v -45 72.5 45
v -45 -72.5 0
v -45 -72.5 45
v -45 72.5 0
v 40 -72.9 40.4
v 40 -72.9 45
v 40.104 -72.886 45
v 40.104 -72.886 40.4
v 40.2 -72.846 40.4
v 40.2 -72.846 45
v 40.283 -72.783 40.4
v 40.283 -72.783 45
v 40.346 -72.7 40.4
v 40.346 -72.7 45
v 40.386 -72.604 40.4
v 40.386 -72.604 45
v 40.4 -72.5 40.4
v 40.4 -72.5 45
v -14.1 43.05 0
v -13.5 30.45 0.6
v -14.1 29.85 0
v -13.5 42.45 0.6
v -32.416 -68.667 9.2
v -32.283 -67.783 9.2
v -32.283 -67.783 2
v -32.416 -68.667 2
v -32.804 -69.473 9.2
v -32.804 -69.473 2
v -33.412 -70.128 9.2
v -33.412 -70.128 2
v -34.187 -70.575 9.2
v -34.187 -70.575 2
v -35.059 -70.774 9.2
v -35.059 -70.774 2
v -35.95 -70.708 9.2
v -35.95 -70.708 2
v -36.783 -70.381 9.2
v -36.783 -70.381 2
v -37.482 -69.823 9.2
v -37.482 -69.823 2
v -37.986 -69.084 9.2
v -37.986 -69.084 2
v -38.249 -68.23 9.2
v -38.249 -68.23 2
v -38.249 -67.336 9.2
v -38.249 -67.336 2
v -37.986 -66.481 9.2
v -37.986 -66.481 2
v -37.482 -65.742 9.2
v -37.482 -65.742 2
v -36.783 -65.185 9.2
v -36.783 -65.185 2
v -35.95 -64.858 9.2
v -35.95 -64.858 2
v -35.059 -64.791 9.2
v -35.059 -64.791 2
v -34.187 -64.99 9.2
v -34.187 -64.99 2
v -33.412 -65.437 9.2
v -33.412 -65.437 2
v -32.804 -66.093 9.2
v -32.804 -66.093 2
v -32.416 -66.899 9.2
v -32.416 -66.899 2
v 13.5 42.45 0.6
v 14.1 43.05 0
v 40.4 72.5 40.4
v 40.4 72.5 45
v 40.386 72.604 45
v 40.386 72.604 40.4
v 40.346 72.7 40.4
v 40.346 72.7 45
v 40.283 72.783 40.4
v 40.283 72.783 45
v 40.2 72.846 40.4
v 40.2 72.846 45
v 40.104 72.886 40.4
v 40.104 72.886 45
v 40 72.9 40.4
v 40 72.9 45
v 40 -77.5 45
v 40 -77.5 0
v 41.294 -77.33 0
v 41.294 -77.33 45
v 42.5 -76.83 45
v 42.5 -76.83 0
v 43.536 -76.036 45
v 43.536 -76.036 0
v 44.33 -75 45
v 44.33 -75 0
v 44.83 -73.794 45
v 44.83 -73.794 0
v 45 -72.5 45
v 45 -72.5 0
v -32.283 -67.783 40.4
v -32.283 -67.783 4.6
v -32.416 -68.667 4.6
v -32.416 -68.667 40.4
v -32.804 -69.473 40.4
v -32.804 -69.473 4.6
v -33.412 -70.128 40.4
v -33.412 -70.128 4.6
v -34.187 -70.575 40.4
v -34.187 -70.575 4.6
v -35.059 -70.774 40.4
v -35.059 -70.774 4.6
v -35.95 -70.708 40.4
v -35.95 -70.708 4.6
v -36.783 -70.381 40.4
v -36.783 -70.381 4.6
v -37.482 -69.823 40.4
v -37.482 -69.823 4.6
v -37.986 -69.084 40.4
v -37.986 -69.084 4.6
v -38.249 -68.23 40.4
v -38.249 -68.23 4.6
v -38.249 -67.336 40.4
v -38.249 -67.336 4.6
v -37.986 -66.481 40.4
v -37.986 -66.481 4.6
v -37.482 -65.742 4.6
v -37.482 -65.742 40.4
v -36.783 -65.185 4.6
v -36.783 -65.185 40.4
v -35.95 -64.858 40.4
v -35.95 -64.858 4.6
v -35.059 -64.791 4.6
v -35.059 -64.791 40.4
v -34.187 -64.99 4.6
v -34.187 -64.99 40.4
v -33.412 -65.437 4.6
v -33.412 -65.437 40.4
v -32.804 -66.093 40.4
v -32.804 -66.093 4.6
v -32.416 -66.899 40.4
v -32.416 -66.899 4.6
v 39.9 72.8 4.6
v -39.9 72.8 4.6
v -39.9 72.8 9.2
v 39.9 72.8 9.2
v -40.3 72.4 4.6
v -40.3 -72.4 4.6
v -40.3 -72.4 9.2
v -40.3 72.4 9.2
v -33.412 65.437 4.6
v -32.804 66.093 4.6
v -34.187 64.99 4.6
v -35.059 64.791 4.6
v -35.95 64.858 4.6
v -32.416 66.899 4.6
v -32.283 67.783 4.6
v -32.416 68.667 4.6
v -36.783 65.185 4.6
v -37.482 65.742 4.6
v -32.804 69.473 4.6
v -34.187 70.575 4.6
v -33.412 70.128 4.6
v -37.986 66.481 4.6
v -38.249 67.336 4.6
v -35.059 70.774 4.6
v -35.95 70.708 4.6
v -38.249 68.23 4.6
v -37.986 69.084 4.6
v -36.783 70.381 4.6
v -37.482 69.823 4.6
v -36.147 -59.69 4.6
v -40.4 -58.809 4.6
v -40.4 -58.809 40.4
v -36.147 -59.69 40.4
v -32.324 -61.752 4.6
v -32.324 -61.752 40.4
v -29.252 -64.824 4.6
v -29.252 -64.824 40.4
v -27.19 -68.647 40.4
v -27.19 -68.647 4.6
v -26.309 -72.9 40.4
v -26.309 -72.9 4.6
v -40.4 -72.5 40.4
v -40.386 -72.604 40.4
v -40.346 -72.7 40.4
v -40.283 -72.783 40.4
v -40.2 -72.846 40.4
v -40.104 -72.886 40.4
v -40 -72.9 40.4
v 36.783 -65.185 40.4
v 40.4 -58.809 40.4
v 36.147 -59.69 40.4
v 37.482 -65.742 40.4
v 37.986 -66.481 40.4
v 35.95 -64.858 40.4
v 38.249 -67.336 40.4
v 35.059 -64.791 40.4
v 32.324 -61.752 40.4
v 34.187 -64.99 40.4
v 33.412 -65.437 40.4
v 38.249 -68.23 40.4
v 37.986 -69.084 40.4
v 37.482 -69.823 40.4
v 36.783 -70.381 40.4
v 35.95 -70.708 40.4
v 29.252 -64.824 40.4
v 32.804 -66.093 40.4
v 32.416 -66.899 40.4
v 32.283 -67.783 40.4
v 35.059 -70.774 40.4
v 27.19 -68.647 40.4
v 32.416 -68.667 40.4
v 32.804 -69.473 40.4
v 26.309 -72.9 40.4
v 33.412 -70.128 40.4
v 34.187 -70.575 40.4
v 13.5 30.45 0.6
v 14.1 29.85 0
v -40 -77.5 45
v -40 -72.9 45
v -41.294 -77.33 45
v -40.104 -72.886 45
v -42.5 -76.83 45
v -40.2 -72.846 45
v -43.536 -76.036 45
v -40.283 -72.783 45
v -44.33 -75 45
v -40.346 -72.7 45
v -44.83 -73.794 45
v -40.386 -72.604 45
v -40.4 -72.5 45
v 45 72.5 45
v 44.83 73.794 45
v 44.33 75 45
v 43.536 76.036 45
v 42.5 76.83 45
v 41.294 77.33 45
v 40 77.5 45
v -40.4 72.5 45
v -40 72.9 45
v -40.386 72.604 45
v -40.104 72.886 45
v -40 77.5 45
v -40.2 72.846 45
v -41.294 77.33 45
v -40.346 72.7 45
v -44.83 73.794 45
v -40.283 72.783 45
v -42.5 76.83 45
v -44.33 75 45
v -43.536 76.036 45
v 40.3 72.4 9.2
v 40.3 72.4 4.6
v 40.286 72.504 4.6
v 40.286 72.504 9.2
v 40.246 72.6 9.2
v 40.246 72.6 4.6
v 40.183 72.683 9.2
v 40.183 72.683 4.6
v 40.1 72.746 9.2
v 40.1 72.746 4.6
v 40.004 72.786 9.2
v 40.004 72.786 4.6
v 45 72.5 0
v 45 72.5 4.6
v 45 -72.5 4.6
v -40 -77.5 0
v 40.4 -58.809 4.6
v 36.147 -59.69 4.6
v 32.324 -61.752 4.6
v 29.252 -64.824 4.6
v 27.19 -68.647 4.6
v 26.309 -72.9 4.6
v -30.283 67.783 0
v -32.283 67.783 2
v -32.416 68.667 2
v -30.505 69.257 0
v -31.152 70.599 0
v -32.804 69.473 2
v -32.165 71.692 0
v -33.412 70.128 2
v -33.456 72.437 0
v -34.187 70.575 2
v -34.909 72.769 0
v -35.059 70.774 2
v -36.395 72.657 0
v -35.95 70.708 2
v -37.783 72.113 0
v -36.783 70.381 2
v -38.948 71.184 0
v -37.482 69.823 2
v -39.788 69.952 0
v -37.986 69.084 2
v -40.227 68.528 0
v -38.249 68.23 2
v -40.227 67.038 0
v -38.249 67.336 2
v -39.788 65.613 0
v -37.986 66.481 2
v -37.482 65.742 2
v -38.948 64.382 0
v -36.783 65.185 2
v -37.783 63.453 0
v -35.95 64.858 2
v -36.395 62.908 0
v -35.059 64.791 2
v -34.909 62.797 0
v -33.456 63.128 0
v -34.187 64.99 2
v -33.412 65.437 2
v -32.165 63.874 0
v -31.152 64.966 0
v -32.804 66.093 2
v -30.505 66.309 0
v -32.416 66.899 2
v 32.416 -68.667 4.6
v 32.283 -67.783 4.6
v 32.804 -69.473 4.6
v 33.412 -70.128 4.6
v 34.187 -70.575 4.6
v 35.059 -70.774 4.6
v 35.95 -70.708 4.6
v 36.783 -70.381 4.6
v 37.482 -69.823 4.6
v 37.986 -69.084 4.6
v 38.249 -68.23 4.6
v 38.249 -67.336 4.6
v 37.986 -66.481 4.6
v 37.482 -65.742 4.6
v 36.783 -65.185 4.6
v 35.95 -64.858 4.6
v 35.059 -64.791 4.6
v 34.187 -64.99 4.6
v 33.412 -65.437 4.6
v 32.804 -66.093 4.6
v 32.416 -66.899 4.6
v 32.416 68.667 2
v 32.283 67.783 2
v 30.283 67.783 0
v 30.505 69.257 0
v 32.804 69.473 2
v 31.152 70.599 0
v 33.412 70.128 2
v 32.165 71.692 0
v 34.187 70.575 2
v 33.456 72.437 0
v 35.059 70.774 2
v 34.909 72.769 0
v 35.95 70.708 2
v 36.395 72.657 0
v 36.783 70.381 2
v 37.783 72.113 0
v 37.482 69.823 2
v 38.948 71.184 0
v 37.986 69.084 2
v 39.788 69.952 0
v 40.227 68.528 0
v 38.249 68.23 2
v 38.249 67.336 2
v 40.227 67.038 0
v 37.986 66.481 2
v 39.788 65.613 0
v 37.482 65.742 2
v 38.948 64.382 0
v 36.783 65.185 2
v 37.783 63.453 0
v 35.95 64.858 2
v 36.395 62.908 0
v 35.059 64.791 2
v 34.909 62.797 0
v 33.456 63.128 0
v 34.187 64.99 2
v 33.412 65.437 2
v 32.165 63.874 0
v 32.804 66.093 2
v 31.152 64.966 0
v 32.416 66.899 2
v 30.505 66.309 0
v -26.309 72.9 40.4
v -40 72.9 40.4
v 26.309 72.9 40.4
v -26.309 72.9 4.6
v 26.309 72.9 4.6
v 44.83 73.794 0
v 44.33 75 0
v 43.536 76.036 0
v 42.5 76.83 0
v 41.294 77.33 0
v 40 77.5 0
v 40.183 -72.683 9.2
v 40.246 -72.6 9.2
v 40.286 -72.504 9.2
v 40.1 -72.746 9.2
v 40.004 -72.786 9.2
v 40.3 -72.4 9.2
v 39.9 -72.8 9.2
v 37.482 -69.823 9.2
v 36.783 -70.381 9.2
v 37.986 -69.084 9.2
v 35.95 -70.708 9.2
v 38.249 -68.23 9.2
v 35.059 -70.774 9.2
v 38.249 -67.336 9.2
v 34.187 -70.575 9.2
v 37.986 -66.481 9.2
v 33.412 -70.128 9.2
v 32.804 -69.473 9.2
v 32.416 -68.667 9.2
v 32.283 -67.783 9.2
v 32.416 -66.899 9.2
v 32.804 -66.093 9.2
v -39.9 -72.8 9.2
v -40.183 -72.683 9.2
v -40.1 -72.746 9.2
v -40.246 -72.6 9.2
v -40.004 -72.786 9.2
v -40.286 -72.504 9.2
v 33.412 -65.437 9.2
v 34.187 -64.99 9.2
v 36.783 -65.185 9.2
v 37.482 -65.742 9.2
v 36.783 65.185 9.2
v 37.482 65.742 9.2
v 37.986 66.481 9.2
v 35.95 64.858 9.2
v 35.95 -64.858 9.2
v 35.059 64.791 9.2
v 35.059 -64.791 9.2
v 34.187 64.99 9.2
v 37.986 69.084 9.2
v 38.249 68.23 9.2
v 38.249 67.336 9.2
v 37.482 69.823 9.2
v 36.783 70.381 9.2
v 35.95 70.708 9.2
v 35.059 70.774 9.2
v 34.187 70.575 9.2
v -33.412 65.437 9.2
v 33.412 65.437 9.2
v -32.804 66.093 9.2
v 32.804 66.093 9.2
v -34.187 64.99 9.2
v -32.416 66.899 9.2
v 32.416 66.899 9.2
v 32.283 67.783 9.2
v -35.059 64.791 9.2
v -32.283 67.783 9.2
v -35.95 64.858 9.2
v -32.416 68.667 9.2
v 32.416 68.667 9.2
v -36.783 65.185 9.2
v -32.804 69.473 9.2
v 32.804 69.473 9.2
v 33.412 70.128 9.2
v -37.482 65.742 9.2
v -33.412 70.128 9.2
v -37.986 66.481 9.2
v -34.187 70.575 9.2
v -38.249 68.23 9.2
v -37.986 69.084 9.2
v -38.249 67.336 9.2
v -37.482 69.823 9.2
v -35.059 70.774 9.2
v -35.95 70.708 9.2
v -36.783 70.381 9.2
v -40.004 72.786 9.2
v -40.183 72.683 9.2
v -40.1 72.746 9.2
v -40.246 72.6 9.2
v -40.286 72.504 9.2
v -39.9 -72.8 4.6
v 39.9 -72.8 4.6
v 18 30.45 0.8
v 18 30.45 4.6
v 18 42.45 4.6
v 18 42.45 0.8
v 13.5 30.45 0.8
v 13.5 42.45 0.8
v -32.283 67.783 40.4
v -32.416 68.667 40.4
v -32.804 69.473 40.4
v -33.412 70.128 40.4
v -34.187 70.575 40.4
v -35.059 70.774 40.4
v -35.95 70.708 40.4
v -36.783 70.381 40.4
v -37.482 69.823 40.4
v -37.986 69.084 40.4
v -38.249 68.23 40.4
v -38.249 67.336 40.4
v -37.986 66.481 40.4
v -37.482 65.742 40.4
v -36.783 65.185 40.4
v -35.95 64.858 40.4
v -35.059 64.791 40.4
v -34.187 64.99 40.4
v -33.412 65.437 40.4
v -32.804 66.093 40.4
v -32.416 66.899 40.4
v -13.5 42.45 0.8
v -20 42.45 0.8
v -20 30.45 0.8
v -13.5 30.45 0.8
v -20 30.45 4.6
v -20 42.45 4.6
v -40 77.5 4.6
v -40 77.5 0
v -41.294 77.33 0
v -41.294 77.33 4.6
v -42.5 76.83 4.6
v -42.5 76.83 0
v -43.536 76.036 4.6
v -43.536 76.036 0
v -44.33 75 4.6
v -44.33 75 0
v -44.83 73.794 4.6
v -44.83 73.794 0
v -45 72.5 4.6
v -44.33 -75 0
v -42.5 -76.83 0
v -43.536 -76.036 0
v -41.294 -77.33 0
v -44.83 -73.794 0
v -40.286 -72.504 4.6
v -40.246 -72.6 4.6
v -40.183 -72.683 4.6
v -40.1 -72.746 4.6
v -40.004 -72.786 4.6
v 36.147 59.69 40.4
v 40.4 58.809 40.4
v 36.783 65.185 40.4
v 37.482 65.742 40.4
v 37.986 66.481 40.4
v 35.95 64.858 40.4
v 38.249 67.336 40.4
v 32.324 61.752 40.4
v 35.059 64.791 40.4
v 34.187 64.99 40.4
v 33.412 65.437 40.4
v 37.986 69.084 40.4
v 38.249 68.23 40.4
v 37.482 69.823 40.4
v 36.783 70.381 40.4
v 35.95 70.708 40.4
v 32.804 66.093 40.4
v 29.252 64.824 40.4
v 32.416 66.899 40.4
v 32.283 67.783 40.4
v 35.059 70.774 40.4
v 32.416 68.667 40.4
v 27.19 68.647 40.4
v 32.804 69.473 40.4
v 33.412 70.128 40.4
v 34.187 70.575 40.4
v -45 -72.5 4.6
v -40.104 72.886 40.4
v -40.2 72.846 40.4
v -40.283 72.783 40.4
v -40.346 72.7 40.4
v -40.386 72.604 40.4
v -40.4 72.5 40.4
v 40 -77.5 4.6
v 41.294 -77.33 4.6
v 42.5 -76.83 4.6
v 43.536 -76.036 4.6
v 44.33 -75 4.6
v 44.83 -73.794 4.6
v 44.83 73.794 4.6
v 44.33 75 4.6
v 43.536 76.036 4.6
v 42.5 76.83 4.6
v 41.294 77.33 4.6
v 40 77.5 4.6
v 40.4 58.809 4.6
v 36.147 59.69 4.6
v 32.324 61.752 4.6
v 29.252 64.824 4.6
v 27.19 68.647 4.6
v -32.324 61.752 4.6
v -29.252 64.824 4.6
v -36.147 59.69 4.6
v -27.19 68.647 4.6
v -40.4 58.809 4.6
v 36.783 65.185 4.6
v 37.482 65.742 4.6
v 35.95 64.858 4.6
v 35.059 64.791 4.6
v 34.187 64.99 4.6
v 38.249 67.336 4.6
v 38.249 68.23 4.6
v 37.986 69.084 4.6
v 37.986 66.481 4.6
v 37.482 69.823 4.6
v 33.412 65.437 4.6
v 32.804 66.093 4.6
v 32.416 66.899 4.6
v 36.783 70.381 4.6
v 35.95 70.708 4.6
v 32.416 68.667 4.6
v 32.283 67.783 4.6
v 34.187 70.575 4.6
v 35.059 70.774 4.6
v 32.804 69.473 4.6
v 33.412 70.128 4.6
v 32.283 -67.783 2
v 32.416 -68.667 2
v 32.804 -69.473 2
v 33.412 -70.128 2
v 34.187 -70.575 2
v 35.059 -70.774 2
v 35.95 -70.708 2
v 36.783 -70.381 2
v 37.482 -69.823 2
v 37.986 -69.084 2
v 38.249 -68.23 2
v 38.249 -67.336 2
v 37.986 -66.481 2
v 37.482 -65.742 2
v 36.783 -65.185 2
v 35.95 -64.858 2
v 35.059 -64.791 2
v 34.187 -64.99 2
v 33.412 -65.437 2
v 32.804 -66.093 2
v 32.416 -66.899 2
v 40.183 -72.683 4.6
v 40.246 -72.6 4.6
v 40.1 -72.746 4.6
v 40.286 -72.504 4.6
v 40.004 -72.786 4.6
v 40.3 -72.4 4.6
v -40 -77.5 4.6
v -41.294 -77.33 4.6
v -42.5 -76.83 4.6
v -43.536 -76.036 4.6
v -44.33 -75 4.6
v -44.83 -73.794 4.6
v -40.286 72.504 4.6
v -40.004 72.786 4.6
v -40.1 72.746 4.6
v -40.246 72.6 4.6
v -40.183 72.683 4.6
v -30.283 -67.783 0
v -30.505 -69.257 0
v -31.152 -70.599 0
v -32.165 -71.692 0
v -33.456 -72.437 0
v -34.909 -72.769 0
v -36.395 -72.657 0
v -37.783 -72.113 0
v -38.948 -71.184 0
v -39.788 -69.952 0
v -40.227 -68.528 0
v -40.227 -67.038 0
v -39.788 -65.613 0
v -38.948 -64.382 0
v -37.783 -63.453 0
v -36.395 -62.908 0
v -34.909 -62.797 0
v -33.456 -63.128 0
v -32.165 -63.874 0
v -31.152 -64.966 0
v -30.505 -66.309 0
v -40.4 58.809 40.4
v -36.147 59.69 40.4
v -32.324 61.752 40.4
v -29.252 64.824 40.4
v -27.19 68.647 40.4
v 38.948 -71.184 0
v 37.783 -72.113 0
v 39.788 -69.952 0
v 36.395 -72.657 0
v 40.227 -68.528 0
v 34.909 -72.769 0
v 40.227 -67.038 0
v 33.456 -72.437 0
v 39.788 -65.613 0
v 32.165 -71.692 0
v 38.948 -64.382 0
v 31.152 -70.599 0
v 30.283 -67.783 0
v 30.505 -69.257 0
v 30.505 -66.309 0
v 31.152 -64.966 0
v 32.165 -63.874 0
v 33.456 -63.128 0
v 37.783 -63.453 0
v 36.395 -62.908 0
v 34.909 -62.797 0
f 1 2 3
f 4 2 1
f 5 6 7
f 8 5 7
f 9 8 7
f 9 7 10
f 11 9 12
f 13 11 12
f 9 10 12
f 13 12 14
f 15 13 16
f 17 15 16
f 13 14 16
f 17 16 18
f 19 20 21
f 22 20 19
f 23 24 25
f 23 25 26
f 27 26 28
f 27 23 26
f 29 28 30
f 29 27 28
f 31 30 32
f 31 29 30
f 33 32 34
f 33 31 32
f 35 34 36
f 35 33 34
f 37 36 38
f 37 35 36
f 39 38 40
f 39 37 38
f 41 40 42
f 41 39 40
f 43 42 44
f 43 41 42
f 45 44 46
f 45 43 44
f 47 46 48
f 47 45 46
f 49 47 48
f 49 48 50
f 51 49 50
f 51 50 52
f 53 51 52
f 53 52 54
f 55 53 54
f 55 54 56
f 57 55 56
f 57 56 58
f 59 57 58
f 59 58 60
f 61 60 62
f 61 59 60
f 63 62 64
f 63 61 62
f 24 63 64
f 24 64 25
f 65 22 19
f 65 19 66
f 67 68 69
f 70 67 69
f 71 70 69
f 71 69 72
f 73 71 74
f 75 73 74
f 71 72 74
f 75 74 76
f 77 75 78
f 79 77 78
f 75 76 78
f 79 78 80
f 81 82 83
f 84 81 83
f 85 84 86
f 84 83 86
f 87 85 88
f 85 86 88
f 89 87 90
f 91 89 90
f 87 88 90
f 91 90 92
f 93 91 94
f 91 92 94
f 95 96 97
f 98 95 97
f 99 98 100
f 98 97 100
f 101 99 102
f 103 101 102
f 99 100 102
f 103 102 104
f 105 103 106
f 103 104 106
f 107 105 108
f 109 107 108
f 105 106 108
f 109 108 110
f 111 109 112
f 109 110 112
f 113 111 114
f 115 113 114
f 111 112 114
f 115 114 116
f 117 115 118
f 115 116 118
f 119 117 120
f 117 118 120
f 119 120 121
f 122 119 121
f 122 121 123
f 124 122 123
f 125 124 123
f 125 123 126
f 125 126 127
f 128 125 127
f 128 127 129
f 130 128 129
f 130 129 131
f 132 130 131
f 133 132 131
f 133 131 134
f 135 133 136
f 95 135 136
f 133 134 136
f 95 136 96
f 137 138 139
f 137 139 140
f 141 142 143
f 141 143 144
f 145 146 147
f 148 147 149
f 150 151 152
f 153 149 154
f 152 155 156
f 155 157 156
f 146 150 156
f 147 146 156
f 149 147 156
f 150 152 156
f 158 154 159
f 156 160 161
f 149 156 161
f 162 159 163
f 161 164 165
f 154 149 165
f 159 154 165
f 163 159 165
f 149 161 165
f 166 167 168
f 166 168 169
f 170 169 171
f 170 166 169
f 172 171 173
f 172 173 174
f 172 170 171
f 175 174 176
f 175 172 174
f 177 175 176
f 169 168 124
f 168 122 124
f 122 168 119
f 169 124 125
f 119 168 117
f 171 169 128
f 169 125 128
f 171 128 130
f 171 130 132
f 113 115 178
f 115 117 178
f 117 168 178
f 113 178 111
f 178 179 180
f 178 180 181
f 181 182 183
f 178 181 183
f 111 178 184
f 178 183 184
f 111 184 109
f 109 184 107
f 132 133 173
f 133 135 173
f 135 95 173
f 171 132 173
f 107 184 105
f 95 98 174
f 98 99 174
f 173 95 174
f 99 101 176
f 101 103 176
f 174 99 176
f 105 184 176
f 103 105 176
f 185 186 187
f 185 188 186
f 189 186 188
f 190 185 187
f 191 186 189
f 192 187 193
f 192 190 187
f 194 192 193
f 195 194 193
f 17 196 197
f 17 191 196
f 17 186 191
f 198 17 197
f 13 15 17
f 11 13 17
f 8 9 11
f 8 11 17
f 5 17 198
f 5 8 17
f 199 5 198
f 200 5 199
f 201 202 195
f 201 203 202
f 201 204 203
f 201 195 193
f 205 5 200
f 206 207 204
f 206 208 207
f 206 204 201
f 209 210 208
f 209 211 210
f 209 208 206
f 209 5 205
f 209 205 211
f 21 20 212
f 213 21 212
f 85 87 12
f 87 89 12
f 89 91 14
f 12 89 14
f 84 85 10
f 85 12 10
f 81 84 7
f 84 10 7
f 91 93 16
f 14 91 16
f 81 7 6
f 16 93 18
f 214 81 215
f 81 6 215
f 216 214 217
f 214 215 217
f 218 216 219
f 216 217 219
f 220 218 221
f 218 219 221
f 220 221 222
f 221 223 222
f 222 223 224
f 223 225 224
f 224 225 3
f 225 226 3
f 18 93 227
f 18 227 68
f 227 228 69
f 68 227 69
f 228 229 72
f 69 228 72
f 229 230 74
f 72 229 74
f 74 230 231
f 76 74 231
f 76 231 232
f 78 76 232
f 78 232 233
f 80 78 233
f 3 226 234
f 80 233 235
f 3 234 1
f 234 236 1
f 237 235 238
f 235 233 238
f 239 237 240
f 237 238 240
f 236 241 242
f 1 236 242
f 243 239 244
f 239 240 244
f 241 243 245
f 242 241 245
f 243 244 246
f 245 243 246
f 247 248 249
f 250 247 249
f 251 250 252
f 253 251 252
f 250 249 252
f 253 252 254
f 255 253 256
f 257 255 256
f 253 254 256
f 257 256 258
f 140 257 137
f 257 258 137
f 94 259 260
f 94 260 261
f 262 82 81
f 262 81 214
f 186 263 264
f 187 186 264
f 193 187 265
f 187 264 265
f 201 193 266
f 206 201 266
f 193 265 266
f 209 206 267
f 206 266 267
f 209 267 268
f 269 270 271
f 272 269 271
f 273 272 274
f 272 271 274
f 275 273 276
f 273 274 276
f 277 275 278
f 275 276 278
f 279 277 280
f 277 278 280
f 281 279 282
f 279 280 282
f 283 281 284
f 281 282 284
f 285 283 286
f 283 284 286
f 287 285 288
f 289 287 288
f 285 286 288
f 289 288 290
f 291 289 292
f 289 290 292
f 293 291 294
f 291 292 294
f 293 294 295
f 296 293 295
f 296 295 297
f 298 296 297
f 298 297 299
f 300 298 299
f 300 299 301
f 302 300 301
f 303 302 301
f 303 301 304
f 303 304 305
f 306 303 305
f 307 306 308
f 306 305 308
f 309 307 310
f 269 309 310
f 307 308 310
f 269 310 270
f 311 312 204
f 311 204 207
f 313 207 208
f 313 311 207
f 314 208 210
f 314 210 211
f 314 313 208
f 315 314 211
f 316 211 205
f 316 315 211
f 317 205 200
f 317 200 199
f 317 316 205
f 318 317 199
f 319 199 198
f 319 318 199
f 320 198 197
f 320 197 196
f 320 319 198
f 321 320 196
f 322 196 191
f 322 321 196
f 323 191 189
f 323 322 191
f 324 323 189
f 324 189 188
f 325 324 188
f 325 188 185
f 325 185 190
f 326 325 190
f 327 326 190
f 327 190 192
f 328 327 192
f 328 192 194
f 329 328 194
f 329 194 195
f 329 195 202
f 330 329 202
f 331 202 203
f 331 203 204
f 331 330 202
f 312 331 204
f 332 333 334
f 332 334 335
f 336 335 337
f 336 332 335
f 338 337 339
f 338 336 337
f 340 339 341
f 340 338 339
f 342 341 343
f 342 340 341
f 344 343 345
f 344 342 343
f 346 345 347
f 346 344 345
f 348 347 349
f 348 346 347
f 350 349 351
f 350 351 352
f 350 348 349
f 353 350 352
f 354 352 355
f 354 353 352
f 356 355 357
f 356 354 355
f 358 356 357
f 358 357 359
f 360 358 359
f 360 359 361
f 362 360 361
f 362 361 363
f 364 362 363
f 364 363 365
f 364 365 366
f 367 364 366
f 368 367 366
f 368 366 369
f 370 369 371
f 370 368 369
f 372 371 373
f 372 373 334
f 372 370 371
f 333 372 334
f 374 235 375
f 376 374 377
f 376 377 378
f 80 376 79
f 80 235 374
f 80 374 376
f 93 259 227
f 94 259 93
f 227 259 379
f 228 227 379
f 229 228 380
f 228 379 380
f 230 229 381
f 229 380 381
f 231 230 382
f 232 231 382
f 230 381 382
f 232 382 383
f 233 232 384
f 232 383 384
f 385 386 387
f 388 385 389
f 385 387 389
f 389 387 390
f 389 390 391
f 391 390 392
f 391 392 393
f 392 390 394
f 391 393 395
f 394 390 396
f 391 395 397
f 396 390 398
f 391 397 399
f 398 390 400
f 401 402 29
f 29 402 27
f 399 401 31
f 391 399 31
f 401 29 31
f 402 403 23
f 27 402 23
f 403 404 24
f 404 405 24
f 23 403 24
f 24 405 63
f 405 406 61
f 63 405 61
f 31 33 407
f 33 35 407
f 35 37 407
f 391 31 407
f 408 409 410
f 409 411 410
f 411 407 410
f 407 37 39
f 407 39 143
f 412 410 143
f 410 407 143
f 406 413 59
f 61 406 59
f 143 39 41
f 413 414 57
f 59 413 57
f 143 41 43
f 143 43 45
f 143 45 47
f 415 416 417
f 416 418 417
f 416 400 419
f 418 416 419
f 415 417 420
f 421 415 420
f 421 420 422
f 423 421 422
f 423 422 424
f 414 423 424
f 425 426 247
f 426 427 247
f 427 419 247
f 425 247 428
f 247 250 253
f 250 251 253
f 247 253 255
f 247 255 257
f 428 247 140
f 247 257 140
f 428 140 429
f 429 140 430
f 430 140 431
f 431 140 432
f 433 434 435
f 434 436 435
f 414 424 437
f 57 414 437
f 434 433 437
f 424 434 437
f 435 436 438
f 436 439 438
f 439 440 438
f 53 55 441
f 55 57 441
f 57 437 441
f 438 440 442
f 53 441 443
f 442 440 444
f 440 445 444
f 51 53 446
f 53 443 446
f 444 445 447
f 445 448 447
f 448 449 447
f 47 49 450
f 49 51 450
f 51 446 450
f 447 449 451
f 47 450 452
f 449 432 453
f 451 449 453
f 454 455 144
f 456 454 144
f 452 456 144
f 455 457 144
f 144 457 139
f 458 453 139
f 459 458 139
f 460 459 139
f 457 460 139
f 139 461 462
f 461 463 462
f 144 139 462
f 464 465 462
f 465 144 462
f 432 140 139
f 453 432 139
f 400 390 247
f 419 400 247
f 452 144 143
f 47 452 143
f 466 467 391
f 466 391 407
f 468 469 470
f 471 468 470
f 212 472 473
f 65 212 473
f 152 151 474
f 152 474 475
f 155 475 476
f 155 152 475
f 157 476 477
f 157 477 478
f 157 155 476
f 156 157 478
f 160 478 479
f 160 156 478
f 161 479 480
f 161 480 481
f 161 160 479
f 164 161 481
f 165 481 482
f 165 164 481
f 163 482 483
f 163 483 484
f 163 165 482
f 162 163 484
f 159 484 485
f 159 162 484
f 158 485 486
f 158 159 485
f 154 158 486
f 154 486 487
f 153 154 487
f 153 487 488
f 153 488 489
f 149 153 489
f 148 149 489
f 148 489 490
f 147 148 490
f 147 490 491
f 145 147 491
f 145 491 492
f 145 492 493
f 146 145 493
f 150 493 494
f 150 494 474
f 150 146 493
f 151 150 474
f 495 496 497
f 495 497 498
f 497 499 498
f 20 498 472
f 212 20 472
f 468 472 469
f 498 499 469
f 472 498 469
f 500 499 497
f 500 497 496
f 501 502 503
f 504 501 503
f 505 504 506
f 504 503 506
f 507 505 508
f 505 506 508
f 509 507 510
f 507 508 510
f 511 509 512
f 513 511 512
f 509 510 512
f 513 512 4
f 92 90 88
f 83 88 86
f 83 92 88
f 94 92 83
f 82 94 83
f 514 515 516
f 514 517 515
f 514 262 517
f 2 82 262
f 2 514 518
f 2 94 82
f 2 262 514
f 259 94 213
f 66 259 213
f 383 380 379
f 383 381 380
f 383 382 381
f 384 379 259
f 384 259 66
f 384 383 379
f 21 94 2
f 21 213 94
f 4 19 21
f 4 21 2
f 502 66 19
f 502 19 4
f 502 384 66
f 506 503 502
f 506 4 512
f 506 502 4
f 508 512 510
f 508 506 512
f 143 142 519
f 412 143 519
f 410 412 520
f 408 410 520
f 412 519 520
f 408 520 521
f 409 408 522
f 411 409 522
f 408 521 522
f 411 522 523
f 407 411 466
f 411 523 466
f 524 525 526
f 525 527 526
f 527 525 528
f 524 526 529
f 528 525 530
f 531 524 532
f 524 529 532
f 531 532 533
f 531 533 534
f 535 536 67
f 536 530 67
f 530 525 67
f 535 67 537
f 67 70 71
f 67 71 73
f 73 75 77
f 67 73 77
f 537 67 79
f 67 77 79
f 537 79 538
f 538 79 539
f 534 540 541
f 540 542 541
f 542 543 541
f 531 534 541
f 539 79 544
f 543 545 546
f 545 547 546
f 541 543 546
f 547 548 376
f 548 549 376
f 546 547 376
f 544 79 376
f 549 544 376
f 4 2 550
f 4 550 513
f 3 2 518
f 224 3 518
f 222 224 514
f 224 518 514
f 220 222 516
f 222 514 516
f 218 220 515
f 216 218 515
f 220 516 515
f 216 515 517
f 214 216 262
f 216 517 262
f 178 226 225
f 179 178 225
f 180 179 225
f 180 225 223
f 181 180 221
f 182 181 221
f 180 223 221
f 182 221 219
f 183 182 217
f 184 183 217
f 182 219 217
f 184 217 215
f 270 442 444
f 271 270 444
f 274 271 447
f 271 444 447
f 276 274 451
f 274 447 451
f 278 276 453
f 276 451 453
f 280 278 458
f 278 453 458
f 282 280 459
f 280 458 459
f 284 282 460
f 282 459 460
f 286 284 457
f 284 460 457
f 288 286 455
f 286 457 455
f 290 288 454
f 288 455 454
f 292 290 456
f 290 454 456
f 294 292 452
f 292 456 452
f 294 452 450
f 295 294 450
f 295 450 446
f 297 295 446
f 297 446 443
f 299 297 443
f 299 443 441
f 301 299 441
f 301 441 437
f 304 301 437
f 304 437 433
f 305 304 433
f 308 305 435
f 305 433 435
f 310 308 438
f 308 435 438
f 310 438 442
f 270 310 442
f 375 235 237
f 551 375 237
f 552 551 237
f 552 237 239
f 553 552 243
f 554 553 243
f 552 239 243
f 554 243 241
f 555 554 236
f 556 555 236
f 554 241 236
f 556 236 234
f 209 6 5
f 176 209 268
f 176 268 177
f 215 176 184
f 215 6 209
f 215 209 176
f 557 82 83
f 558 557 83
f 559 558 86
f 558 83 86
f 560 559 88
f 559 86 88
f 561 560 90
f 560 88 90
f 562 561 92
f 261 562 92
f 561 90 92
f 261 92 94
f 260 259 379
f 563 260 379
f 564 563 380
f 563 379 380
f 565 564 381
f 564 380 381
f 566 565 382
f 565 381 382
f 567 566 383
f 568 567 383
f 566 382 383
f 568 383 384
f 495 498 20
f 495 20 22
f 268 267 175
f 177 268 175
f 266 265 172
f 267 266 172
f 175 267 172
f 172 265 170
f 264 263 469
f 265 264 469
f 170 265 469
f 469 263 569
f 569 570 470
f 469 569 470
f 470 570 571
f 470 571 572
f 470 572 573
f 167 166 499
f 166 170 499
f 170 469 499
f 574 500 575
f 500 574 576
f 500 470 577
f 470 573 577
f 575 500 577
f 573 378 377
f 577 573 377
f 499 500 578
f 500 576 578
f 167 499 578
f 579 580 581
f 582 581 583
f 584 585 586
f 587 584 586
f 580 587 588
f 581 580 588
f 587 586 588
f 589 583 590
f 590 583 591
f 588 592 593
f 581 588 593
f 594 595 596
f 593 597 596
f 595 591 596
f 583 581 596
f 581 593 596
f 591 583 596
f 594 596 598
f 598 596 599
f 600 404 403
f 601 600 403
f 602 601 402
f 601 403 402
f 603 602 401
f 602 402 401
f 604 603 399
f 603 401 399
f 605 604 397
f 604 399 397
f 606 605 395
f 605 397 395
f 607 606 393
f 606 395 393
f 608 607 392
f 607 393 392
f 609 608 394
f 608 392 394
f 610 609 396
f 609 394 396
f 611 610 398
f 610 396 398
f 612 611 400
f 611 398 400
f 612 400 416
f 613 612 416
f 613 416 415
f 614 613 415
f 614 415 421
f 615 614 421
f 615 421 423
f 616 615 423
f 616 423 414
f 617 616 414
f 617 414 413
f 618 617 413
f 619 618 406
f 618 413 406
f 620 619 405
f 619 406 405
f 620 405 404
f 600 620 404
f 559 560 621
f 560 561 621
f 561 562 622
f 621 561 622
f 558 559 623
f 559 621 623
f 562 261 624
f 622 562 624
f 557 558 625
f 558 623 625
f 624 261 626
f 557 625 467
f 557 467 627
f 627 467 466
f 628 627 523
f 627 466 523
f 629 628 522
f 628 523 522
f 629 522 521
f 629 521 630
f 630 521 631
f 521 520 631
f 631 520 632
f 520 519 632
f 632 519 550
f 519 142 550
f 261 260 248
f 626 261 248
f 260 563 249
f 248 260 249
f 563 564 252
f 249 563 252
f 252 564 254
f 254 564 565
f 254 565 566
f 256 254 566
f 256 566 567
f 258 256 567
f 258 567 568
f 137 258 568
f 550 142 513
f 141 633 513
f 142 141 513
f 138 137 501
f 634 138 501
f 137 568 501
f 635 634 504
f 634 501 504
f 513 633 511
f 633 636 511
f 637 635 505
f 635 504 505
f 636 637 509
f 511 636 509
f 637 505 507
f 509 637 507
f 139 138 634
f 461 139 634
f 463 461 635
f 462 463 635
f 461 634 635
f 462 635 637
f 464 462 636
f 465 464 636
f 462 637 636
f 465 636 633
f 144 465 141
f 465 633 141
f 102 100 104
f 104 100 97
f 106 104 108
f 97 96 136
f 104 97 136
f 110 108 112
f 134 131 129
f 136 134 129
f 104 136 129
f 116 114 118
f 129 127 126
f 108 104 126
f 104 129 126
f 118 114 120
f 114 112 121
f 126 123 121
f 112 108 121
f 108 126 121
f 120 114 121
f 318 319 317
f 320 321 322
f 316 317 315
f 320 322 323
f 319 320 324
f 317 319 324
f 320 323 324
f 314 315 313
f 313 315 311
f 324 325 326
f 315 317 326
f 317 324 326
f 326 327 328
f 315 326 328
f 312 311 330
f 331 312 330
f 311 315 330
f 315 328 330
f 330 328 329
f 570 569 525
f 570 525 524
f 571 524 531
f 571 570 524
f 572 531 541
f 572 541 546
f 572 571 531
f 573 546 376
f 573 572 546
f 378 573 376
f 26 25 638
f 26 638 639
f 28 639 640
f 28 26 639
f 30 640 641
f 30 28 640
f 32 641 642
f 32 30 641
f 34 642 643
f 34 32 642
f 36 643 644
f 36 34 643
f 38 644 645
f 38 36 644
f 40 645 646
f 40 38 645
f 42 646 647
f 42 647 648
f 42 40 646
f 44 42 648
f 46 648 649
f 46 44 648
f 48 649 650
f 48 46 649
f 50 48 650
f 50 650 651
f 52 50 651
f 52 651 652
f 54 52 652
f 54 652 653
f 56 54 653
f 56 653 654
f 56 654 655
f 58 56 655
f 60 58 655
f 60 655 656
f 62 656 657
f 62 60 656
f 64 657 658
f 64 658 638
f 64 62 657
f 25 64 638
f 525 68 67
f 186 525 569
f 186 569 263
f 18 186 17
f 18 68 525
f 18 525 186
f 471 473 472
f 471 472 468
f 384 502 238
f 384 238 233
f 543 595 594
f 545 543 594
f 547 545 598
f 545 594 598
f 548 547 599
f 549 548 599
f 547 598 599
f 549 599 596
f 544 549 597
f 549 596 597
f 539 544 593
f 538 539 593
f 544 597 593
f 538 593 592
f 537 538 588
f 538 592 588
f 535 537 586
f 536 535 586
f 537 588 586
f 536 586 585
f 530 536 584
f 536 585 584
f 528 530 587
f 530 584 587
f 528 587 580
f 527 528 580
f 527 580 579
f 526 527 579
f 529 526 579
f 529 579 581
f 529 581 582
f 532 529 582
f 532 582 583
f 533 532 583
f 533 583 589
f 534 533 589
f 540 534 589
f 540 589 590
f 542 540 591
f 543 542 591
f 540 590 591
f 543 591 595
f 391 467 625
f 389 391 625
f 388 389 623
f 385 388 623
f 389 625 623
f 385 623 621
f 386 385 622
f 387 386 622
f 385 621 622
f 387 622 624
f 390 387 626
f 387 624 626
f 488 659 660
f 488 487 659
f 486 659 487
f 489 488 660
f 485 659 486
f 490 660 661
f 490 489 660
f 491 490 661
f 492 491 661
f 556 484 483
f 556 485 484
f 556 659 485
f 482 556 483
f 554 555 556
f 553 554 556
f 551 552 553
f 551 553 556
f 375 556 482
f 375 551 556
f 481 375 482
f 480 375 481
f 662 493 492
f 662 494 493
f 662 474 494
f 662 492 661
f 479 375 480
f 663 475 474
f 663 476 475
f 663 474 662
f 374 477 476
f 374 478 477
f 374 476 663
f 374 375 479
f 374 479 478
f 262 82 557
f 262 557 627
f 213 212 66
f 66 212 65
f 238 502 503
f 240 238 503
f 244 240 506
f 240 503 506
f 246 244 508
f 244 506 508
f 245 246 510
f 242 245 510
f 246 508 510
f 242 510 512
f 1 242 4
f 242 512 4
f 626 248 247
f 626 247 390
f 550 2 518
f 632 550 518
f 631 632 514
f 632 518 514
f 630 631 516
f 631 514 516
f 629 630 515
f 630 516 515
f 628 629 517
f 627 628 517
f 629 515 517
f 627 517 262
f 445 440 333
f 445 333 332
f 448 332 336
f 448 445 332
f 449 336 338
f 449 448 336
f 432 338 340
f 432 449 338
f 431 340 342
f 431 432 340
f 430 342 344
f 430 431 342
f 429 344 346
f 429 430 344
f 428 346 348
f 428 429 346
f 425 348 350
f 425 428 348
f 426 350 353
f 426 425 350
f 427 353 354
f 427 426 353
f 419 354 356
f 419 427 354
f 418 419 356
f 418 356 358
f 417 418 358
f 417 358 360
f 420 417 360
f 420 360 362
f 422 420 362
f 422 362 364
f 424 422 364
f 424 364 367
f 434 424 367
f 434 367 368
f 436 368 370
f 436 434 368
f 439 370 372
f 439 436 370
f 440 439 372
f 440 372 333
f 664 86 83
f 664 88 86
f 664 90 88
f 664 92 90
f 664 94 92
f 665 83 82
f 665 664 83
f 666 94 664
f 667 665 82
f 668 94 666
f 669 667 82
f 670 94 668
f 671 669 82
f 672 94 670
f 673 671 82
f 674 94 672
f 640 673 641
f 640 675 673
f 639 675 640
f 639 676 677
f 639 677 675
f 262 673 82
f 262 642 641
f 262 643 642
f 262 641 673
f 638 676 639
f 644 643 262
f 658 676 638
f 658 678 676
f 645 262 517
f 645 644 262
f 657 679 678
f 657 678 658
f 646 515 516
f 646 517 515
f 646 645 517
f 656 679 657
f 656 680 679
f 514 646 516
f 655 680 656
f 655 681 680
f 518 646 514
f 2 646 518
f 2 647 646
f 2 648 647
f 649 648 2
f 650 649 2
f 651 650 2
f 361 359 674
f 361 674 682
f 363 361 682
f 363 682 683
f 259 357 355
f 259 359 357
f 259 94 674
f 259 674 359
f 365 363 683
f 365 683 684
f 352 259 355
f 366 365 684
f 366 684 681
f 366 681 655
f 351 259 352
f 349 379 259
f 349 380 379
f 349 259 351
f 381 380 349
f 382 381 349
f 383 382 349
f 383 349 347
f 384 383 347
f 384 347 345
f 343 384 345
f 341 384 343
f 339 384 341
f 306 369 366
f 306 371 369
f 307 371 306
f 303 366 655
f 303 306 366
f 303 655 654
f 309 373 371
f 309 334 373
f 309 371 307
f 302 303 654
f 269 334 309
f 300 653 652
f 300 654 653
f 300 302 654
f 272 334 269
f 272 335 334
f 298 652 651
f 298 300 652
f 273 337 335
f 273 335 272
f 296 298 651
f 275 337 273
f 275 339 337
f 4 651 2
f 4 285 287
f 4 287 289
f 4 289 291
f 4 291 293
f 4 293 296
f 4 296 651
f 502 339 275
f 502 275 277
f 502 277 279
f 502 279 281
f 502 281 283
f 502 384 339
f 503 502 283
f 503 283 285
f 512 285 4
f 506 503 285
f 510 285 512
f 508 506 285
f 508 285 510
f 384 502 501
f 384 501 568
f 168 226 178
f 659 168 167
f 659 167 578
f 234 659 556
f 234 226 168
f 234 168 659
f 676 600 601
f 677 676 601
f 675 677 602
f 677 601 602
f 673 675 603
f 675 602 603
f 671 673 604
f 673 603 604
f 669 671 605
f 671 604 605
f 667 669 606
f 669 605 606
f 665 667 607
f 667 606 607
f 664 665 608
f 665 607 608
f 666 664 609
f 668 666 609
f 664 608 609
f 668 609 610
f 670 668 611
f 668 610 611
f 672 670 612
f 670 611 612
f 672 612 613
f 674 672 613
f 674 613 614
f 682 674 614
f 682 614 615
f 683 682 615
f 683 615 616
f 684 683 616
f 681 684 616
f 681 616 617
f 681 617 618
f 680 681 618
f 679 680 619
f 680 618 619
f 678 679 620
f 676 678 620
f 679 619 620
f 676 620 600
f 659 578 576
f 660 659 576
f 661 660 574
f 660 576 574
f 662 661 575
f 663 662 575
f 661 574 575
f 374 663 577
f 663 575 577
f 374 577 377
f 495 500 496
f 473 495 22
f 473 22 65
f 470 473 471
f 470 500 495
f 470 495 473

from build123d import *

# Parameters (mm, degrees)
PAD_DEPTH                     = 45
POCKET_DEPTH                  = 40.4
SKETCH002_R                   = 3
PAD001_DEPTH                  = 35.8
SKETCH002_MIRRORED_2_R        = 3
PAD001_MIRRORED_2_DEPTH       = 35.8
SKETCH006_W                   = 27
SKETCH006_H                   = 12
POCKET002_DEPTH               = 4.6
SKETCH007_W                   = 38
SKETCH007_H                   = 12
POCKET003_DEPTH               = 3.8
CHAMFER001_SIZE               = 0.6
PAD002_DEPTH                  = 4.6
PAD003_DEPTH                  = 4.6
SKETCH005_R                   = 3
POCKET001_DEPTH               = 9.2
SKETCH005_MIRRORED002_2_R     = 3
POCKET001_MIRRORED002_2_DEPTH = 9.2
CHAMFER_SIZE                  = 2


with BuildPart() as boxbody:
    # Sketch → Pad (new body)
    with BuildSketch(Plane.XY):
        with BuildLine():
            Line((-40, 77.5), (40, 77.5))
            ThreePointArc((45, 72.5), (43.535534, 76.035534), (40, 77.5))
            Line((45, 72.5), (45, -72.5))
            ThreePointArc((40, -77.5), (43.535534, -76.035534), (45, -72.5))
            Line((40, -77.5), (-40, -77.5))
            ThreePointArc((-45, -72.5), (-43.535534, -76.035534), (-40, -77.5))
            Line((-45, -72.5), (-45, 72.5))
            ThreePointArc((-40, 77.5), (-43.535534, 76.035534), (-45, 72.5))
        make_face()
    extrude(amount=PAD_DEPTH)

    # Sketch001 (on Face10 of Pad) → Pocket (cut)
    with BuildSketch(Plane.XY.offset(45)):
        with BuildLine():
            Line((-40, 72.9), (40, 72.9))
            ThreePointArc((40.4, 72.5), (40.282843, 72.782843), (40, 72.9))
            Line((40.4, 72.5), (40.4, -72.5))
            ThreePointArc((40, -72.9), (40.282843, -72.782843), (40.4, -72.5))
            Line((40, -72.9), (-40, -72.9))
            ThreePointArc((-40.4, -72.5), (-40.282843, -72.782843), (-40, -72.9))
            Line((-40.4, -72.5), (-40.4, 72.5))
            ThreePointArc((-40, 72.9), (-40.282843, 72.782843), (-40.4, 72.5))
        make_face()
    extrude(amount=-POCKET_DEPTH, mode=Mode.SUBTRACT)

    # Sketch002 (on Face19 of Pocket) → Pad001 (join)
    with BuildSketch(Plane.XY.offset(4.6)):
        with BuildLine():
            Line((-41.282843, 73.782843), (-42.7, 58.849937))
            ThreePointArc((-42.7, 58.849937), (-30.676241, 63.176241), (-26.349937, 75.2))
            Line((-41.282843, 73.782843), (-26.349937, 75.2))
        make_face()
        with Locations((-35.282843, 67.782843)):
            Circle(SKETCH002_R, mode=Mode.SUBTRACT)
    pad001 = extrude(amount=PAD001_DEPTH)

    # Sketch002 Mirrored 2 → Pad001 Mirrored 2 (add)
    with BuildSketch(Plane(origin=(0, 0, 4.6), x_dir=(-1, 0, 0), z_dir=(0, 0, -1))):
        with BuildLine():
            Line((-41.282843, 73.782843), (-42.7, 58.849937))
            ThreePointArc((-42.7, 58.849937), (-30.676241, 63.176241), (-26.349937, 75.2))
            Line((-41.282843, 73.782843), (-26.349937, 75.2))
        make_face()
        with Locations((-35.282843, 67.782843)):
            Circle(SKETCH002_MIRRORED_2_R, mode=Mode.SUBTRACT)
    pad001_mirrored_2 = extrude(amount=-PAD001_MIRRORED_2_DEPTH)

    # Mirrored001: Pad001, Pad001 Mirrored 2 across Sketch002 H_Axis
    add(pad001.mirror(Plane(origin=(0, 0, 4.6), x_dir=(0, 0, 1), z_dir=(0, 1, 0))))
    add(pad001_mirrored_2.mirror(Plane(origin=(0, 0, 4.6), x_dir=(0, 0, 1), z_dir=(0, 1, 0))))

    # Sketch006 (on Face21 of MultiTransform) → Pocket002 (cut)
    with BuildSketch(Plane.XY.offset(4.6)):
        with Locations((0, 36.45)):
            Rectangle(SKETCH006_W, SKETCH006_H)
    extrude(amount=-POCKET002_DEPTH, mode=Mode.SUBTRACT)

    # Sketch007 (on Face23 of Pocket002) → Pocket003 (cut)
    with BuildSketch(Plane.XY.offset(4.6)):
        with Locations((-1, 36.45)):
            Rectangle(SKETCH007_W, SKETCH007_H)
    extrude(amount=-POCKET003_DEPTH, mode=Mode.SUBTRACT)

    # Chamfer001
    chamfer001_edges = [boxbody.edges().sort_by_distance(p)[0] for p in [
        (0, 42.45, 0),
        (13.5, 36.45, 0),
        (0, 30.45, 0),
        (-13.5, 36.45, 0),
    ]]
    chamfer(chamfer001_edges, length=CHAMFER001_SIZE)


with BuildPart() as lidbody:
    # Sketch003 → Pad002 (new body)
    with BuildSketch(Plane.XY):
        with BuildLine():
            Line((-40, 77.5), (40, 77.5))
            ThreePointArc((45, 72.5), (43.535534, 76.035534), (40, 77.5))
            Line((45, 72.5), (45, -72.5))
            ThreePointArc((40, -77.5), (43.535534, -76.035534), (45, -72.5))
            Line((40, -77.5), (-40, -77.5))
            ThreePointArc((-45, -72.5), (-43.535534, -76.035534), (-40, -77.5))
            Line((-45, -72.5), (-45, 72.5))
            ThreePointArc((-40, 77.5), (-43.535534, 76.035534), (-45, 72.5))
        make_face()
    extrude(amount=PAD002_DEPTH)

    # Sketch004 (on Face10 of Pad002) → Pad003 (join)
    with BuildSketch(Plane.XY.offset(4.6)):
        with BuildLine():
            Line((-39.9, 72.8), (39.9, 72.8))
            ThreePointArc((40.3, 72.4), (40.182843, 72.682843), (39.9, 72.8))
            Line((40.3, 72.4), (40.3, -72.4))
            ThreePointArc((39.9, -72.8), (40.182843, -72.682843), (40.3, -72.4))
            Line((39.9, -72.8), (-39.9, -72.8))
            ThreePointArc((-40.3, -72.4), (-40.182843, -72.682843), (-39.9, -72.8))
            Line((-40.3, -72.4), (-40.3, 72.4))
            ThreePointArc((-39.9, 72.8), (-40.182843, 72.682843), (-40.3, 72.4))
        make_face()
    extrude(amount=PAD003_DEPTH)

    # Sketch005 (on Face19 of Pad003) → Pocket001 (cut)
    with BuildSketch(Plane.XY.offset(9.2)):
        with Locations((-35.282843, 67.782843)):
            Circle(SKETCH005_R)
    pocket001 = extrude(amount=-POCKET001_DEPTH, mode=Mode.SUBTRACT)

    # Sketch005 Mirrored002 2 → Pocket001 Mirrored002 2 (cut)
    with BuildSketch(Plane(origin=(0, 0, 9.2), x_dir=(-1, 0, 0), z_dir=(0, 0, -1))):
        with Locations((-35.282843, 67.782843)):
            Circle(SKETCH005_MIRRORED002_2_R)
    pocket001_mirrored002_2 = extrude(amount=POCKET001_MIRRORED002_2_DEPTH, mode=Mode.SUBTRACT)

    # Mirrored003: Pocket001, Pocket001 Mirrored002 2 across Sketch005 H_Axis
    add(pocket001.mirror(Plane(origin=(0, 0, 9.2), x_dir=(0, 0, 1), z_dir=(0, 1, 0))), mode=Mode.SUBTRACT)
    add(pocket001_mirrored002_2.mirror(Plane(origin=(0, 0, 9.2), x_dir=(0, 0, 1), z_dir=(0, 1, 0))), mode=Mode.SUBTRACT)

    # Chamfer
    chamfer_edges = [lidbody.edges().sort_by_distance(p)[0] for p in [
        (-38.282843, 67.782843, 0),
        (-38.282843, -67.782843, 0),
        (38.282843, -67.782843, 0),
        (38.282843, 67.782843, 0),
    ]]
    chamfer(chamfer_edges, length=CHAMFER_SIZE)


solid = Compound([boxbody.part, lidbody.part])
